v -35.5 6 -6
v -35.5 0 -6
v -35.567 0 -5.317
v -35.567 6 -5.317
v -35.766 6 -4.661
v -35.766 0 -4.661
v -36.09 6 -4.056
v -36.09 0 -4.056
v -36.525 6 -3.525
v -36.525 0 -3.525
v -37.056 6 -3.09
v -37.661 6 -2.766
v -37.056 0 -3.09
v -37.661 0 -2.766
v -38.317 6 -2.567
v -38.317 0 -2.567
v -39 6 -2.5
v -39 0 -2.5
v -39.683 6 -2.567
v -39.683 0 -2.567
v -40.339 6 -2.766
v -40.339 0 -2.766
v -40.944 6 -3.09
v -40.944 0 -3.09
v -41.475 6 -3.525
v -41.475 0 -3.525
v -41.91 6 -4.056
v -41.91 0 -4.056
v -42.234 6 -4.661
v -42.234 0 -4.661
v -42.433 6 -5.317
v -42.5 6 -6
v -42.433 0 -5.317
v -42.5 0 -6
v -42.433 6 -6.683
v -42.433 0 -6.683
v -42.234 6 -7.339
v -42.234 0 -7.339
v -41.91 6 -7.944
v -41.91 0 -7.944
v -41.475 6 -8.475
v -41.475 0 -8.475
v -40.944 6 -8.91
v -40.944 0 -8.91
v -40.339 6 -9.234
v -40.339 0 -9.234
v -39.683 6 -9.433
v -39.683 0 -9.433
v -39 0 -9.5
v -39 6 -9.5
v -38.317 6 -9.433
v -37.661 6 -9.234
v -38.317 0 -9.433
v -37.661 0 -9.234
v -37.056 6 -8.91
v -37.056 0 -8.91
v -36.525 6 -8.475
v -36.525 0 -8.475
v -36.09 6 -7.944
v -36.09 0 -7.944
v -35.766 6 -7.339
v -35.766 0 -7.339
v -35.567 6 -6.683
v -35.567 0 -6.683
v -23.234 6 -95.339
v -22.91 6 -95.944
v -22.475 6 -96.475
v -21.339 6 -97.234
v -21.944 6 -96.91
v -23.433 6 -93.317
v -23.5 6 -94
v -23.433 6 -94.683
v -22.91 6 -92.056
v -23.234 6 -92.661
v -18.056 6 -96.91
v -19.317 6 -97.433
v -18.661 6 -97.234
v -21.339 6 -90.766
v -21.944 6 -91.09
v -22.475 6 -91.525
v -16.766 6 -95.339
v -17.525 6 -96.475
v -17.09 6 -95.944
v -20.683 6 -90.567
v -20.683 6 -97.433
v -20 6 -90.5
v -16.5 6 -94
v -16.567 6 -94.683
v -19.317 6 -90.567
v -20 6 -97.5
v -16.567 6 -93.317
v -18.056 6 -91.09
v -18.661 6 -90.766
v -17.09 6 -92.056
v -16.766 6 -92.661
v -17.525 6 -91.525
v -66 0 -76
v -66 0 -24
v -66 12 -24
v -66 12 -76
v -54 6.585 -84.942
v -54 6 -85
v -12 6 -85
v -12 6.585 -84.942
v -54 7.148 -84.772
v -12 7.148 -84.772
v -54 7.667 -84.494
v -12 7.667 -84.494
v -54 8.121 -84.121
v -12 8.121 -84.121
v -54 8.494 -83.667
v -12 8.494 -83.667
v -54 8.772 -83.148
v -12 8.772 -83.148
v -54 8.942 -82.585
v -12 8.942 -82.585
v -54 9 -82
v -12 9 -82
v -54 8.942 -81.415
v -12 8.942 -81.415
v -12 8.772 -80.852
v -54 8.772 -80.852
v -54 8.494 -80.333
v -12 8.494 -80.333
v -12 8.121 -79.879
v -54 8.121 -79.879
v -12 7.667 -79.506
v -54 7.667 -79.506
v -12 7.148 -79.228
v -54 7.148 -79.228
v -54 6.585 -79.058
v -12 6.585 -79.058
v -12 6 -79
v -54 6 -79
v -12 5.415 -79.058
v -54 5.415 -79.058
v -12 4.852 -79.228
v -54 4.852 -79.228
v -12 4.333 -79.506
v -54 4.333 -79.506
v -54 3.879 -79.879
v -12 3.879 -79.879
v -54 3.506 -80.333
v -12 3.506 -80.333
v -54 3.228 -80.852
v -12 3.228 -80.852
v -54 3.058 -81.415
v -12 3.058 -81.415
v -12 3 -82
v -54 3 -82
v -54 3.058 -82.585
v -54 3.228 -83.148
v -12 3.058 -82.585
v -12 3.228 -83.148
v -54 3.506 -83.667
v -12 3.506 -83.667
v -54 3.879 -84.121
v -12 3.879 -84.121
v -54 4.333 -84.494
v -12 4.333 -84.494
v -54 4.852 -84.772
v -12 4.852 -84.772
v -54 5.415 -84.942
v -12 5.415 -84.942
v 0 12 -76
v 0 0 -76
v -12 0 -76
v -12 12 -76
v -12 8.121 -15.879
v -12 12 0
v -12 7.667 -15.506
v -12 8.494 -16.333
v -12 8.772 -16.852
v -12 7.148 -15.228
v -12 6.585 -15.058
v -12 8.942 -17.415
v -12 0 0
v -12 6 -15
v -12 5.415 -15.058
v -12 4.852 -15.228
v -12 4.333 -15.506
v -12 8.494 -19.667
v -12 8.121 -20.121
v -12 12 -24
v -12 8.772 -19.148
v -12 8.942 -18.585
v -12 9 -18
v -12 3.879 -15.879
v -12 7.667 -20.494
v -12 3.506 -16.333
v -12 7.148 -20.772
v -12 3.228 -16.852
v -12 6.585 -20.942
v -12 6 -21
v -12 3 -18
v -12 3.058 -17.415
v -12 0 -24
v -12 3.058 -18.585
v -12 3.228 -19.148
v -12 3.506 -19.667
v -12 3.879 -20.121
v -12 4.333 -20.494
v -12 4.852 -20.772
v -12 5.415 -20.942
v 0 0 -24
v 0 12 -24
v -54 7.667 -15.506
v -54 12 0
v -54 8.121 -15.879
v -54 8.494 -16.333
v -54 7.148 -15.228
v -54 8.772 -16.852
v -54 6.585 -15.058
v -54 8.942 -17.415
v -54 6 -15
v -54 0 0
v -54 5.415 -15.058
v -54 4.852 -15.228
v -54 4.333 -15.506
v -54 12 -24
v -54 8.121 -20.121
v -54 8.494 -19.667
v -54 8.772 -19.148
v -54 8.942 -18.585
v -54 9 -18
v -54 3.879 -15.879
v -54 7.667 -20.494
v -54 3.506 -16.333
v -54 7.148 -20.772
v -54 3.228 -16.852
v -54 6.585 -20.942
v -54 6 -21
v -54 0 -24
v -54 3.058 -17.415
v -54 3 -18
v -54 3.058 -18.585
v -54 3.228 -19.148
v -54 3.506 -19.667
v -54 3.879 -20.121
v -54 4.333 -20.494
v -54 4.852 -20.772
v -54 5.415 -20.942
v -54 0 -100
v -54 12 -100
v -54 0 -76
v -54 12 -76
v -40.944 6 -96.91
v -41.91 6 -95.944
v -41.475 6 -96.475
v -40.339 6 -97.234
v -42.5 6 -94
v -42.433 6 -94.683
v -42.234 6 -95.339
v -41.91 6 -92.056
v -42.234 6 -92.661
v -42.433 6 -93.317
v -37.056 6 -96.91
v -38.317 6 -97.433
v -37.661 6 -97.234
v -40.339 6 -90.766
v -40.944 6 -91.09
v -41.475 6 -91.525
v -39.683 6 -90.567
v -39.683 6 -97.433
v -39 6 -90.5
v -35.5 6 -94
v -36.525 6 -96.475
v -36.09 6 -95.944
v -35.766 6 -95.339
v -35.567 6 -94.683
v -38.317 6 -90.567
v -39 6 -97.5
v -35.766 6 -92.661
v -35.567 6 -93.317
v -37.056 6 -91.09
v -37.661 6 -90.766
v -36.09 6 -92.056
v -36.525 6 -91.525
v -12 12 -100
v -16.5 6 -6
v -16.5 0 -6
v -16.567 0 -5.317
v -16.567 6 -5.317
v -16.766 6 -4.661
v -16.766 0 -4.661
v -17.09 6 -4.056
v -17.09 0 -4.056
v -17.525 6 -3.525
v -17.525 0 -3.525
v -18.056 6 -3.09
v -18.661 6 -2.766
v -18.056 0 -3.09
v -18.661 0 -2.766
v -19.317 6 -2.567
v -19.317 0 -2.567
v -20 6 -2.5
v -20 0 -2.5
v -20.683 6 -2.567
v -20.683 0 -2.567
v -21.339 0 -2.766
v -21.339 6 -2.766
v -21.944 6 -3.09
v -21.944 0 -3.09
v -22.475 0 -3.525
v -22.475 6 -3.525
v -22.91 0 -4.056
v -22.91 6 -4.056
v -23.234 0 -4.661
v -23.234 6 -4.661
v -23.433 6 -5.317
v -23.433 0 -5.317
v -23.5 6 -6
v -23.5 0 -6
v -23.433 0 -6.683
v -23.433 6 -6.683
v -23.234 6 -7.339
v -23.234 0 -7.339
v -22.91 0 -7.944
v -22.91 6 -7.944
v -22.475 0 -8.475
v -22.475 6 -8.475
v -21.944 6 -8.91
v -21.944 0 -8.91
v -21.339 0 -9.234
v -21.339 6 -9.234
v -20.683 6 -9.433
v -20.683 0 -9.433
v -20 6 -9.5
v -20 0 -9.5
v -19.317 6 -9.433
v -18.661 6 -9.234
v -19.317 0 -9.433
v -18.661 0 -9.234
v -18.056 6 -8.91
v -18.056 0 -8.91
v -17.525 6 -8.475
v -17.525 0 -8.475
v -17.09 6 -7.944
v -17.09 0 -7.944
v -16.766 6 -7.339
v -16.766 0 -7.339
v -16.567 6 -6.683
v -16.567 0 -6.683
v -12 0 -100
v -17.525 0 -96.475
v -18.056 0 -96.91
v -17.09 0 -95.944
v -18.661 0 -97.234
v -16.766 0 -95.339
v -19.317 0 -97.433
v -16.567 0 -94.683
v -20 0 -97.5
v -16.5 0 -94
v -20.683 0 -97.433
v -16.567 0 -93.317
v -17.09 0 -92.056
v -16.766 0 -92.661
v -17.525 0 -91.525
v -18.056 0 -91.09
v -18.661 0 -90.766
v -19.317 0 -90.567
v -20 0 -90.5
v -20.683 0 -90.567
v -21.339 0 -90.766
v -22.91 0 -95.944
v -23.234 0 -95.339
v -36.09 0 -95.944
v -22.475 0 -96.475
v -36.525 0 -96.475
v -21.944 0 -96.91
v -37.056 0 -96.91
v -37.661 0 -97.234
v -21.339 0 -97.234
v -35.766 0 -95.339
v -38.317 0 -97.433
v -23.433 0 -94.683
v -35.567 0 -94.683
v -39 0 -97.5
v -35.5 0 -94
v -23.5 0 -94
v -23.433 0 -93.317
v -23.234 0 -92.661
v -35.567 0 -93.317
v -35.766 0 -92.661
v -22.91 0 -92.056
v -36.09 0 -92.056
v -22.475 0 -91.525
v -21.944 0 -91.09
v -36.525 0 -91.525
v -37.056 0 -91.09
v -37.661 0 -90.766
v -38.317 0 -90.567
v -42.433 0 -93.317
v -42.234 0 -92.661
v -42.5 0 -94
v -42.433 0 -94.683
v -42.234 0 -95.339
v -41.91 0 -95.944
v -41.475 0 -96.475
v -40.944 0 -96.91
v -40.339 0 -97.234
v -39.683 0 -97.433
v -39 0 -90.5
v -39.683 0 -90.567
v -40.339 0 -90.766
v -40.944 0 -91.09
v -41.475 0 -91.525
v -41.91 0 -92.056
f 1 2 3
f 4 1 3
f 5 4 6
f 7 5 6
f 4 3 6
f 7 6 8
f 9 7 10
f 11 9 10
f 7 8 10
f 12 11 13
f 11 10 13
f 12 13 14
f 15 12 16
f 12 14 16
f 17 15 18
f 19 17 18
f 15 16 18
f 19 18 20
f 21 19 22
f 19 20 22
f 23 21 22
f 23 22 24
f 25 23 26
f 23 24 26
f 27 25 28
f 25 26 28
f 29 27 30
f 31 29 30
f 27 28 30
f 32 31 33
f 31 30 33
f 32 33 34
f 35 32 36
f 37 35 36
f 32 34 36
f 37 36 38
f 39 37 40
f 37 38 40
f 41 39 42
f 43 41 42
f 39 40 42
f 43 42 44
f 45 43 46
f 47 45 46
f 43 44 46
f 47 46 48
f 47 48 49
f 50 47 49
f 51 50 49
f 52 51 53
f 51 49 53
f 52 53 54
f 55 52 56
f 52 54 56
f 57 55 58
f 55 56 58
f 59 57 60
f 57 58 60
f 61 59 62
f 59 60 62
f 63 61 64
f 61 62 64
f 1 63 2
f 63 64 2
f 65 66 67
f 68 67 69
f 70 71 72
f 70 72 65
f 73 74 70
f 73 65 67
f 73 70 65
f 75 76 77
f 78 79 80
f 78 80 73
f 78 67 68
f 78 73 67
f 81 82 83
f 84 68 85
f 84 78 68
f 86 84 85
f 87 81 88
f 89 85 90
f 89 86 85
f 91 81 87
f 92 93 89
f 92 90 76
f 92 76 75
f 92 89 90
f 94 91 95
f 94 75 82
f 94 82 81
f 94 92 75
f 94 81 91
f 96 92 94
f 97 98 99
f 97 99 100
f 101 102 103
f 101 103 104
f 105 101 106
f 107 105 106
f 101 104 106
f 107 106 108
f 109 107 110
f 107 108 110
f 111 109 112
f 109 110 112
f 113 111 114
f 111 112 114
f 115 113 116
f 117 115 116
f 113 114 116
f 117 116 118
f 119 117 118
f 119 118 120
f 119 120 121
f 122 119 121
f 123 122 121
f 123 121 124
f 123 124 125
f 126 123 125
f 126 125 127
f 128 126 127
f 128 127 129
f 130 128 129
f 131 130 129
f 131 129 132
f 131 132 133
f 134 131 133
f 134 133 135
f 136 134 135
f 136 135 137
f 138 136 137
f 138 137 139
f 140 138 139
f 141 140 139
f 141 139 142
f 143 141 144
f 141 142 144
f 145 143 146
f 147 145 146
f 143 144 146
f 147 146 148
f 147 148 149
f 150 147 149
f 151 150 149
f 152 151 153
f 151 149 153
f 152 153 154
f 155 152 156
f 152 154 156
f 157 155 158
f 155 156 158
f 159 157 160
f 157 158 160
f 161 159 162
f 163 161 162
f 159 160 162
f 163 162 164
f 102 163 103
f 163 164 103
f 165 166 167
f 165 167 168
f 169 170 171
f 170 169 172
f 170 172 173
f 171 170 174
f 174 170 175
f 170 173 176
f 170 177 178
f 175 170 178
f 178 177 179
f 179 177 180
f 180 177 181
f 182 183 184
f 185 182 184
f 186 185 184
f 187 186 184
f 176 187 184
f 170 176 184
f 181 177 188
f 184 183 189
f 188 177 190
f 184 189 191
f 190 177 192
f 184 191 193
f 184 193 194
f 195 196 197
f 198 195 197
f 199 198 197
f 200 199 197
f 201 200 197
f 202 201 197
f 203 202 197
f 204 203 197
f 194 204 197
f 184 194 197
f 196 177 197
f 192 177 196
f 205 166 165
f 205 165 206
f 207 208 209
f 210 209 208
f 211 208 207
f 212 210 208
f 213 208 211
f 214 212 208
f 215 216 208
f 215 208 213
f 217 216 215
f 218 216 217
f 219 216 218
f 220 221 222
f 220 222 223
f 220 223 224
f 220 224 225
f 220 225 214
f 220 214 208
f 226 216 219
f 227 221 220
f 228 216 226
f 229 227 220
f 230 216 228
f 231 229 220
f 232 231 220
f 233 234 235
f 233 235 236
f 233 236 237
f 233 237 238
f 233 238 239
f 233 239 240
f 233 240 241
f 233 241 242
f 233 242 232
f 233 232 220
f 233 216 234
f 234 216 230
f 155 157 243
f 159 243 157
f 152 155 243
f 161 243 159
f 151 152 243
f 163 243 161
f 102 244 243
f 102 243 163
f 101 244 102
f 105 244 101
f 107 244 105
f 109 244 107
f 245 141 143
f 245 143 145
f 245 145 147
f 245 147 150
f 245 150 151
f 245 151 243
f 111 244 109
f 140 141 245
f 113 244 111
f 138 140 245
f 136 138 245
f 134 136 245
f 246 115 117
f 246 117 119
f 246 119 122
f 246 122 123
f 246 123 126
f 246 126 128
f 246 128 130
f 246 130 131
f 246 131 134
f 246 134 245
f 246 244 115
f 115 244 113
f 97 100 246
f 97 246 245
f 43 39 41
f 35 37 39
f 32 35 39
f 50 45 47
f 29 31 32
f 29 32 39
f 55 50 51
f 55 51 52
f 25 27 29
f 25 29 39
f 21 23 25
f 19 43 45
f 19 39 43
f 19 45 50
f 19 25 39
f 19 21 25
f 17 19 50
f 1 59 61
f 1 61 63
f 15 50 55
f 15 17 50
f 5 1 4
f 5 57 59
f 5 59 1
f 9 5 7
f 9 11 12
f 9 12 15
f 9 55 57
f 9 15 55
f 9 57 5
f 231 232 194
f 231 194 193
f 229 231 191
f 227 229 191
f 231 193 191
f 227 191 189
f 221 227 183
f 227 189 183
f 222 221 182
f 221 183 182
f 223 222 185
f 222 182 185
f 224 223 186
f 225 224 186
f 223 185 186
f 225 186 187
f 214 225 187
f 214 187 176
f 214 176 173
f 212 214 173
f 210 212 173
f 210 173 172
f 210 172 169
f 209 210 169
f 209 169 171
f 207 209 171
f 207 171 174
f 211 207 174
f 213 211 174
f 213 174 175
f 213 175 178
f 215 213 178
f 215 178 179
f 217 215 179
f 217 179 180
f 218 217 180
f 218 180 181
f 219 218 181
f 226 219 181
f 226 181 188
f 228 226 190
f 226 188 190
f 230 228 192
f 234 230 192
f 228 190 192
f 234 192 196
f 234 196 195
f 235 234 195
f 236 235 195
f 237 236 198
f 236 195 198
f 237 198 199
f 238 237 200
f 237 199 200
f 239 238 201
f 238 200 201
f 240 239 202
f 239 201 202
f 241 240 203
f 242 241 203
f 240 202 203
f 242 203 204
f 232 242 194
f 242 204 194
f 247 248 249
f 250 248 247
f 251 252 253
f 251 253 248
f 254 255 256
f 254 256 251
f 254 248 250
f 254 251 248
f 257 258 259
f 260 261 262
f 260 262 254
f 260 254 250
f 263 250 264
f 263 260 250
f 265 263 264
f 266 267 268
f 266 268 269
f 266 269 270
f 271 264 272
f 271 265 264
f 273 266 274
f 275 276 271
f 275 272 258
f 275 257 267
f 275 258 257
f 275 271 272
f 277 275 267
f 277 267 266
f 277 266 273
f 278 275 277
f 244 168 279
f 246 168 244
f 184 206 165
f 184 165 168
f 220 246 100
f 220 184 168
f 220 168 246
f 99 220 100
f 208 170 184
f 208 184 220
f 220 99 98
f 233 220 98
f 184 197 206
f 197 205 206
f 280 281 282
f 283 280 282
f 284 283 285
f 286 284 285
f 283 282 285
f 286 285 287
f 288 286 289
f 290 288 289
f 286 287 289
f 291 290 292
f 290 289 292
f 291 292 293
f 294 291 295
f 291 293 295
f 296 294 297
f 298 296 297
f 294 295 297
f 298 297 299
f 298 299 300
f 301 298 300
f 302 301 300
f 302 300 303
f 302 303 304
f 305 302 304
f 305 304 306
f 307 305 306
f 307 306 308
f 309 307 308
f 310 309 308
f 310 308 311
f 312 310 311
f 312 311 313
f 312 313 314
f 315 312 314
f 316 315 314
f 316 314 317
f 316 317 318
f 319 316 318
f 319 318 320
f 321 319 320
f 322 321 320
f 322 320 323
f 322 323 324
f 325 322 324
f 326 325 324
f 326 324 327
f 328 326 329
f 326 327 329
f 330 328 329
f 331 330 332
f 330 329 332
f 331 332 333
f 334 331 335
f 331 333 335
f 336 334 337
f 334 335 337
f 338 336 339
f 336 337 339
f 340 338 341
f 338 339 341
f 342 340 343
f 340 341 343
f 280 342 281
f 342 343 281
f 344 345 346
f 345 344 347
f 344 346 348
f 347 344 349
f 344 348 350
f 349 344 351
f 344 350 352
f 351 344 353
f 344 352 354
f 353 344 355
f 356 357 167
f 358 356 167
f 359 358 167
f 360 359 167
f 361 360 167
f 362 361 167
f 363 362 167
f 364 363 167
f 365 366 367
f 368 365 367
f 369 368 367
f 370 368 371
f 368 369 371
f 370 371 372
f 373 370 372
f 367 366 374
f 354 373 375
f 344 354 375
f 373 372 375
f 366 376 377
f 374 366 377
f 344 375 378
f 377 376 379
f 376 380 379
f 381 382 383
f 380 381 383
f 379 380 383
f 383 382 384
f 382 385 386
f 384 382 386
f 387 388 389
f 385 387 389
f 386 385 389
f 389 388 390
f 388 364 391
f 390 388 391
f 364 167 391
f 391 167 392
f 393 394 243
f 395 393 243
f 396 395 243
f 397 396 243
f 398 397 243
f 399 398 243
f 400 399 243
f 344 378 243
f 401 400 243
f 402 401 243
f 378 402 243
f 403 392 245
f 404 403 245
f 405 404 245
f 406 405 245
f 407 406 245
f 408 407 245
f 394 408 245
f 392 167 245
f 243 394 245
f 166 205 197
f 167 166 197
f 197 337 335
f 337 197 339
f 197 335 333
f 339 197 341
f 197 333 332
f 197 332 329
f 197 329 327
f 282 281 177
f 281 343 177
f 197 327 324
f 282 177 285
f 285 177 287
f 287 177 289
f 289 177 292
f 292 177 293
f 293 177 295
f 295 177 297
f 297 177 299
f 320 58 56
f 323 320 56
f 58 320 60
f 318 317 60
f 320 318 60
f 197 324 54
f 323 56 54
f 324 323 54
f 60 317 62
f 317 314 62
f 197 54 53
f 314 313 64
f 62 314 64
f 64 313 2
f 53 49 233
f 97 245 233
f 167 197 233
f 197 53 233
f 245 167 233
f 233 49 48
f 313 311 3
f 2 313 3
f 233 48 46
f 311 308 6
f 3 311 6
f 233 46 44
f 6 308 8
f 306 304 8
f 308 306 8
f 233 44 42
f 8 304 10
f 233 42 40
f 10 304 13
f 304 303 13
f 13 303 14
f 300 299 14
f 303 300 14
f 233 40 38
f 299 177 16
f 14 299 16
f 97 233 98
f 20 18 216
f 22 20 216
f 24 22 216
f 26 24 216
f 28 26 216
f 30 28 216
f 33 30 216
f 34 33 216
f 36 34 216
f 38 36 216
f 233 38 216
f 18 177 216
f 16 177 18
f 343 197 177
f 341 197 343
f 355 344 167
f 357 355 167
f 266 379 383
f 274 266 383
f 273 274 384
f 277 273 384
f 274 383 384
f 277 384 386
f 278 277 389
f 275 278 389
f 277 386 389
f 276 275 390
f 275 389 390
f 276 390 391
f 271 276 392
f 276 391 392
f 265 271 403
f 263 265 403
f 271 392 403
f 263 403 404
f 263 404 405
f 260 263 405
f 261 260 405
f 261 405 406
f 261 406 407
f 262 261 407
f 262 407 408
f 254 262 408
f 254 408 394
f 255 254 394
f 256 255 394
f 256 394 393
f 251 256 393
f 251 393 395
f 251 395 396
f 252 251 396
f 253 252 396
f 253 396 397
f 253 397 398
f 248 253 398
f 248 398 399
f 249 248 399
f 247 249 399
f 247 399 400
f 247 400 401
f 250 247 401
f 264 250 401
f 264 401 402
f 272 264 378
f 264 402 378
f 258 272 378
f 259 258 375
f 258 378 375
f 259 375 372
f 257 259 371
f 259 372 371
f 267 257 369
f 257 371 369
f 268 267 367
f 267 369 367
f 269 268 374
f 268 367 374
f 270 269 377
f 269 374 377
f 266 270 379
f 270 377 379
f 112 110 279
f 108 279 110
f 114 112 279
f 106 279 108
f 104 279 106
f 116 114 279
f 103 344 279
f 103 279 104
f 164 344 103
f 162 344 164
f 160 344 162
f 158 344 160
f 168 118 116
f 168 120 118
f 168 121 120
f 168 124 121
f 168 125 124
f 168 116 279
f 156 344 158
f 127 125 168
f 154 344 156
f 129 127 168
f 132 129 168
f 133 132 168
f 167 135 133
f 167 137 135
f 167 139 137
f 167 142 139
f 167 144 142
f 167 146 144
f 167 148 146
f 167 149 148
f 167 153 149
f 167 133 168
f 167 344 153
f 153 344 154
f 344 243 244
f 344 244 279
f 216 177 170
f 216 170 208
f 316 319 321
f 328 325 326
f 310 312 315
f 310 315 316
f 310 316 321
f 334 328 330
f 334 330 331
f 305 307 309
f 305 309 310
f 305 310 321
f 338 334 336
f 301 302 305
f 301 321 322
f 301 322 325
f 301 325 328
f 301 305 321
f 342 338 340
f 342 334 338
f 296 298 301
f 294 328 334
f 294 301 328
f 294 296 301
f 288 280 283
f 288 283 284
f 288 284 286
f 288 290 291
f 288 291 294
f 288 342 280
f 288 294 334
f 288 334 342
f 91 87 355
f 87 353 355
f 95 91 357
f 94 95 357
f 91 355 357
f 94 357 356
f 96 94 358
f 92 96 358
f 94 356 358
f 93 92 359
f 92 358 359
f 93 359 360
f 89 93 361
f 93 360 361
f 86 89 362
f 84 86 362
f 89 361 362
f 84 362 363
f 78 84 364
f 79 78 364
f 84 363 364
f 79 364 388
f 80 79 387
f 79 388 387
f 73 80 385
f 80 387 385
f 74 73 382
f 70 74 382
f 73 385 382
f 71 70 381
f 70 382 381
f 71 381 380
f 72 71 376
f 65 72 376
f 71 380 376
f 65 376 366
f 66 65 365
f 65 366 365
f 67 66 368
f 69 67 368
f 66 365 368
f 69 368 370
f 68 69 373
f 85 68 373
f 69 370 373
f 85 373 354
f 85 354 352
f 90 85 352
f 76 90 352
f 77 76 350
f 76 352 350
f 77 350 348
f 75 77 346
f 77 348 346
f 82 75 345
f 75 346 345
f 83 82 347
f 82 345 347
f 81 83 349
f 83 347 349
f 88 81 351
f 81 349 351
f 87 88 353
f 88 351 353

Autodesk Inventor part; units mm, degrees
ref_plane "YZ Plane" through (0, 0, 0) normal (1, 0, 0) x (0, 1, 0)
ref_plane "XZ Plane" through (0, 0, 0) normal (0, 1, 0) x (-1, 0, 0)
ref_plane "XY Plane" through (0, 0, 0) normal (0, 0, 1) x (1, 0, 0)
sketch "Sketch1" plane through (0, 0, 0) normal (0, 1, 0) x (-1, 0, 0)
  line L0 (0, 0) -> (66, 0)
  line L1 (66, 0) -> (66, -100)
  line L2 (66, -100) -> (0, -100)
  line L3 (0, -100) -> (0, 0)
  line L4 (66, 0) -> (54, 0)
  line L5 (54, 0) -> (54, -12)
  line L6 (54, -12) -> (66, -12)
  line L7 (66, -12) -> (66, 0)
  line L8 (0, 0) -> (12, 0)
  line L9 (12, 0) -> (12, -12)
  line L10 (12, -12) -> (0, -12)
  line L11 (0, -12) -> (0, 0)
  line L12 (0, -100) -> (12, -100)
  line L13 (12, -100) -> (12, -88)
  line L14 (12, -88) -> (0, -88)
  line L15 (0, -88) -> (0, -100)
  line L16 (66, -100) -> (54, -100)
  line L17 (54, -100) -> (54, -88)
  line L18 (54, -88) -> (66, -88)
  line L19 (66, -88) -> (66, -100)
  dimension "d0" = 66
  dimension "d1" = 100
  dimension "d2" = 12
  dimension "d3" = 12
  dimension "d4" = 12
  dimension "d5" = 12
  dimension "d6" = 12
  dimension "d7" = 12
  dimension "d8" = 12
  dimension "d9" = 12
extrude "Extrusion1" add sketch "Sketch1" along normal blind 12 contours L0 L5 L6 L1 L18 L17 L2 L13 L14 L3 L10 L9
sketch "Sketch5" plane through (-66, 0, -88) normal (-1, 0, 0) x (0, 0, 1)
  line L0 (0, 12) -> (-12, 12) projected
  line L1 (0, 12) -> (12, 12)
  line L2 (12, 12) -> (12, 0)
  line L3 (12, 0) -> (0, 0)
  line L4 (0, 0) -> (0, 12)
  line L5 (76, 12) -> (64, 12)
  line L6 (64, 12) -> (64, 0)
  line L7 (64, 0) -> (76, 0)
  line L8 (76, 0) -> (76, 12)
  point P0 (88, 0)
  dimension "d42" = 12
  dimension "d43" = 12
  dimension "d44" = 12
  dimension "d45" = 12
  dimension "d46" = 12
extrude "Extrusion5" cut sketch "Sketch5" against normal blind 12
sketch "Sketch6" plane through (0, 0, -12) normal (1, 0, 0) x (0, 0, -1)
  line L0 (76, 0) -> (76, 12) projected
  line L1 (64, 12) -> (12, 12) projected
  line L2 (76, 0) -> (64, 0)
  line L3 (64, 0) -> (64, 12)
  line L4 (64, 12) -> (76, 12)
  line L5 (76, 12) -> (76, 0)
  line L6 (64, 0) -> (12, 0) projected
  line L7 (12, 12) -> (-12, 12) projected
  line L8 (0, 0) -> (12, 0)
  line L9 (12, 0) -> (12, 12)
  line L10 (12, 12) -> (0, 12)
  line L11 (0, 12) -> (0, 0)
  point P0 (-12, 0)
  dimension "d49" = 12
  dimension "d50" = 12
extrude "Extrusion6" cut sketch "Sketch6" against normal blind 12 contours L2 L3 L4 L0 | L8 L11 L7 L9
sketch "Sketch7" plane through (-12, -12, -100) normal (1, 0, 0) x (0, 0, -1)
  circle A0 centre (-18, 18) radius 3
  circle A1 centre (-82, 18) radius 3
  line L0 (-100, 24) -> (-76, 24) projected
  line L1 (-76, 24) -> (-76, 12) projected
  line L2 (-24, 12) -> (-24, 24) projected
  line L3 (-24, 24) -> (0, 24) projected
  point P0 (-100, 12)
  dimension "d53" = 6
  dimension "d54" = 6
  dimension "d55" = 6
  dimension "d56" = 6
  dimension "d57" = 6
  dimension "d58" = 6
extrude "Extrusion7" cut sketch "Sketch7" against normal up to next
sketch "Sketch8" plane through (0, 0, 0) normal (0, -1, 0) x (1, 0, 0)
  circle A0 centre (-20, -6) radius 3.5
  circle A1 centre (-39, -6) radius 3.5
  circle A2 centre (-20, -94) radius 3.5
  circle A3 centre (-39, -94) radius 3.5
  line L0 (-12, -100) -> (-54, -100) projected
  line L1 (-54, 0) -> (-12, 0) projected
  line L2 (-12, 0) -> (-12, -24) projected
  line L3 (-12, -100) -> (-12, -76) projected
  point P0 (0, 0)
  dimension "d61" = 7
  dimension "d62" = 7
  dimension "d63" = 7
  dimension "d64" = 6
  dimension "d65" = 7
  dimension "d66" = 6
  dimension "d67" = 6
  dimension "d68" = 6
  dimension "d69" = 8
  dimension "d70" = 19
  dimension "d71" = 8
  dimension "d72" = 19
extrude "Extrusion8" cut sketch "Sketch8" against normal blind 6
properties part number "frameBack"
